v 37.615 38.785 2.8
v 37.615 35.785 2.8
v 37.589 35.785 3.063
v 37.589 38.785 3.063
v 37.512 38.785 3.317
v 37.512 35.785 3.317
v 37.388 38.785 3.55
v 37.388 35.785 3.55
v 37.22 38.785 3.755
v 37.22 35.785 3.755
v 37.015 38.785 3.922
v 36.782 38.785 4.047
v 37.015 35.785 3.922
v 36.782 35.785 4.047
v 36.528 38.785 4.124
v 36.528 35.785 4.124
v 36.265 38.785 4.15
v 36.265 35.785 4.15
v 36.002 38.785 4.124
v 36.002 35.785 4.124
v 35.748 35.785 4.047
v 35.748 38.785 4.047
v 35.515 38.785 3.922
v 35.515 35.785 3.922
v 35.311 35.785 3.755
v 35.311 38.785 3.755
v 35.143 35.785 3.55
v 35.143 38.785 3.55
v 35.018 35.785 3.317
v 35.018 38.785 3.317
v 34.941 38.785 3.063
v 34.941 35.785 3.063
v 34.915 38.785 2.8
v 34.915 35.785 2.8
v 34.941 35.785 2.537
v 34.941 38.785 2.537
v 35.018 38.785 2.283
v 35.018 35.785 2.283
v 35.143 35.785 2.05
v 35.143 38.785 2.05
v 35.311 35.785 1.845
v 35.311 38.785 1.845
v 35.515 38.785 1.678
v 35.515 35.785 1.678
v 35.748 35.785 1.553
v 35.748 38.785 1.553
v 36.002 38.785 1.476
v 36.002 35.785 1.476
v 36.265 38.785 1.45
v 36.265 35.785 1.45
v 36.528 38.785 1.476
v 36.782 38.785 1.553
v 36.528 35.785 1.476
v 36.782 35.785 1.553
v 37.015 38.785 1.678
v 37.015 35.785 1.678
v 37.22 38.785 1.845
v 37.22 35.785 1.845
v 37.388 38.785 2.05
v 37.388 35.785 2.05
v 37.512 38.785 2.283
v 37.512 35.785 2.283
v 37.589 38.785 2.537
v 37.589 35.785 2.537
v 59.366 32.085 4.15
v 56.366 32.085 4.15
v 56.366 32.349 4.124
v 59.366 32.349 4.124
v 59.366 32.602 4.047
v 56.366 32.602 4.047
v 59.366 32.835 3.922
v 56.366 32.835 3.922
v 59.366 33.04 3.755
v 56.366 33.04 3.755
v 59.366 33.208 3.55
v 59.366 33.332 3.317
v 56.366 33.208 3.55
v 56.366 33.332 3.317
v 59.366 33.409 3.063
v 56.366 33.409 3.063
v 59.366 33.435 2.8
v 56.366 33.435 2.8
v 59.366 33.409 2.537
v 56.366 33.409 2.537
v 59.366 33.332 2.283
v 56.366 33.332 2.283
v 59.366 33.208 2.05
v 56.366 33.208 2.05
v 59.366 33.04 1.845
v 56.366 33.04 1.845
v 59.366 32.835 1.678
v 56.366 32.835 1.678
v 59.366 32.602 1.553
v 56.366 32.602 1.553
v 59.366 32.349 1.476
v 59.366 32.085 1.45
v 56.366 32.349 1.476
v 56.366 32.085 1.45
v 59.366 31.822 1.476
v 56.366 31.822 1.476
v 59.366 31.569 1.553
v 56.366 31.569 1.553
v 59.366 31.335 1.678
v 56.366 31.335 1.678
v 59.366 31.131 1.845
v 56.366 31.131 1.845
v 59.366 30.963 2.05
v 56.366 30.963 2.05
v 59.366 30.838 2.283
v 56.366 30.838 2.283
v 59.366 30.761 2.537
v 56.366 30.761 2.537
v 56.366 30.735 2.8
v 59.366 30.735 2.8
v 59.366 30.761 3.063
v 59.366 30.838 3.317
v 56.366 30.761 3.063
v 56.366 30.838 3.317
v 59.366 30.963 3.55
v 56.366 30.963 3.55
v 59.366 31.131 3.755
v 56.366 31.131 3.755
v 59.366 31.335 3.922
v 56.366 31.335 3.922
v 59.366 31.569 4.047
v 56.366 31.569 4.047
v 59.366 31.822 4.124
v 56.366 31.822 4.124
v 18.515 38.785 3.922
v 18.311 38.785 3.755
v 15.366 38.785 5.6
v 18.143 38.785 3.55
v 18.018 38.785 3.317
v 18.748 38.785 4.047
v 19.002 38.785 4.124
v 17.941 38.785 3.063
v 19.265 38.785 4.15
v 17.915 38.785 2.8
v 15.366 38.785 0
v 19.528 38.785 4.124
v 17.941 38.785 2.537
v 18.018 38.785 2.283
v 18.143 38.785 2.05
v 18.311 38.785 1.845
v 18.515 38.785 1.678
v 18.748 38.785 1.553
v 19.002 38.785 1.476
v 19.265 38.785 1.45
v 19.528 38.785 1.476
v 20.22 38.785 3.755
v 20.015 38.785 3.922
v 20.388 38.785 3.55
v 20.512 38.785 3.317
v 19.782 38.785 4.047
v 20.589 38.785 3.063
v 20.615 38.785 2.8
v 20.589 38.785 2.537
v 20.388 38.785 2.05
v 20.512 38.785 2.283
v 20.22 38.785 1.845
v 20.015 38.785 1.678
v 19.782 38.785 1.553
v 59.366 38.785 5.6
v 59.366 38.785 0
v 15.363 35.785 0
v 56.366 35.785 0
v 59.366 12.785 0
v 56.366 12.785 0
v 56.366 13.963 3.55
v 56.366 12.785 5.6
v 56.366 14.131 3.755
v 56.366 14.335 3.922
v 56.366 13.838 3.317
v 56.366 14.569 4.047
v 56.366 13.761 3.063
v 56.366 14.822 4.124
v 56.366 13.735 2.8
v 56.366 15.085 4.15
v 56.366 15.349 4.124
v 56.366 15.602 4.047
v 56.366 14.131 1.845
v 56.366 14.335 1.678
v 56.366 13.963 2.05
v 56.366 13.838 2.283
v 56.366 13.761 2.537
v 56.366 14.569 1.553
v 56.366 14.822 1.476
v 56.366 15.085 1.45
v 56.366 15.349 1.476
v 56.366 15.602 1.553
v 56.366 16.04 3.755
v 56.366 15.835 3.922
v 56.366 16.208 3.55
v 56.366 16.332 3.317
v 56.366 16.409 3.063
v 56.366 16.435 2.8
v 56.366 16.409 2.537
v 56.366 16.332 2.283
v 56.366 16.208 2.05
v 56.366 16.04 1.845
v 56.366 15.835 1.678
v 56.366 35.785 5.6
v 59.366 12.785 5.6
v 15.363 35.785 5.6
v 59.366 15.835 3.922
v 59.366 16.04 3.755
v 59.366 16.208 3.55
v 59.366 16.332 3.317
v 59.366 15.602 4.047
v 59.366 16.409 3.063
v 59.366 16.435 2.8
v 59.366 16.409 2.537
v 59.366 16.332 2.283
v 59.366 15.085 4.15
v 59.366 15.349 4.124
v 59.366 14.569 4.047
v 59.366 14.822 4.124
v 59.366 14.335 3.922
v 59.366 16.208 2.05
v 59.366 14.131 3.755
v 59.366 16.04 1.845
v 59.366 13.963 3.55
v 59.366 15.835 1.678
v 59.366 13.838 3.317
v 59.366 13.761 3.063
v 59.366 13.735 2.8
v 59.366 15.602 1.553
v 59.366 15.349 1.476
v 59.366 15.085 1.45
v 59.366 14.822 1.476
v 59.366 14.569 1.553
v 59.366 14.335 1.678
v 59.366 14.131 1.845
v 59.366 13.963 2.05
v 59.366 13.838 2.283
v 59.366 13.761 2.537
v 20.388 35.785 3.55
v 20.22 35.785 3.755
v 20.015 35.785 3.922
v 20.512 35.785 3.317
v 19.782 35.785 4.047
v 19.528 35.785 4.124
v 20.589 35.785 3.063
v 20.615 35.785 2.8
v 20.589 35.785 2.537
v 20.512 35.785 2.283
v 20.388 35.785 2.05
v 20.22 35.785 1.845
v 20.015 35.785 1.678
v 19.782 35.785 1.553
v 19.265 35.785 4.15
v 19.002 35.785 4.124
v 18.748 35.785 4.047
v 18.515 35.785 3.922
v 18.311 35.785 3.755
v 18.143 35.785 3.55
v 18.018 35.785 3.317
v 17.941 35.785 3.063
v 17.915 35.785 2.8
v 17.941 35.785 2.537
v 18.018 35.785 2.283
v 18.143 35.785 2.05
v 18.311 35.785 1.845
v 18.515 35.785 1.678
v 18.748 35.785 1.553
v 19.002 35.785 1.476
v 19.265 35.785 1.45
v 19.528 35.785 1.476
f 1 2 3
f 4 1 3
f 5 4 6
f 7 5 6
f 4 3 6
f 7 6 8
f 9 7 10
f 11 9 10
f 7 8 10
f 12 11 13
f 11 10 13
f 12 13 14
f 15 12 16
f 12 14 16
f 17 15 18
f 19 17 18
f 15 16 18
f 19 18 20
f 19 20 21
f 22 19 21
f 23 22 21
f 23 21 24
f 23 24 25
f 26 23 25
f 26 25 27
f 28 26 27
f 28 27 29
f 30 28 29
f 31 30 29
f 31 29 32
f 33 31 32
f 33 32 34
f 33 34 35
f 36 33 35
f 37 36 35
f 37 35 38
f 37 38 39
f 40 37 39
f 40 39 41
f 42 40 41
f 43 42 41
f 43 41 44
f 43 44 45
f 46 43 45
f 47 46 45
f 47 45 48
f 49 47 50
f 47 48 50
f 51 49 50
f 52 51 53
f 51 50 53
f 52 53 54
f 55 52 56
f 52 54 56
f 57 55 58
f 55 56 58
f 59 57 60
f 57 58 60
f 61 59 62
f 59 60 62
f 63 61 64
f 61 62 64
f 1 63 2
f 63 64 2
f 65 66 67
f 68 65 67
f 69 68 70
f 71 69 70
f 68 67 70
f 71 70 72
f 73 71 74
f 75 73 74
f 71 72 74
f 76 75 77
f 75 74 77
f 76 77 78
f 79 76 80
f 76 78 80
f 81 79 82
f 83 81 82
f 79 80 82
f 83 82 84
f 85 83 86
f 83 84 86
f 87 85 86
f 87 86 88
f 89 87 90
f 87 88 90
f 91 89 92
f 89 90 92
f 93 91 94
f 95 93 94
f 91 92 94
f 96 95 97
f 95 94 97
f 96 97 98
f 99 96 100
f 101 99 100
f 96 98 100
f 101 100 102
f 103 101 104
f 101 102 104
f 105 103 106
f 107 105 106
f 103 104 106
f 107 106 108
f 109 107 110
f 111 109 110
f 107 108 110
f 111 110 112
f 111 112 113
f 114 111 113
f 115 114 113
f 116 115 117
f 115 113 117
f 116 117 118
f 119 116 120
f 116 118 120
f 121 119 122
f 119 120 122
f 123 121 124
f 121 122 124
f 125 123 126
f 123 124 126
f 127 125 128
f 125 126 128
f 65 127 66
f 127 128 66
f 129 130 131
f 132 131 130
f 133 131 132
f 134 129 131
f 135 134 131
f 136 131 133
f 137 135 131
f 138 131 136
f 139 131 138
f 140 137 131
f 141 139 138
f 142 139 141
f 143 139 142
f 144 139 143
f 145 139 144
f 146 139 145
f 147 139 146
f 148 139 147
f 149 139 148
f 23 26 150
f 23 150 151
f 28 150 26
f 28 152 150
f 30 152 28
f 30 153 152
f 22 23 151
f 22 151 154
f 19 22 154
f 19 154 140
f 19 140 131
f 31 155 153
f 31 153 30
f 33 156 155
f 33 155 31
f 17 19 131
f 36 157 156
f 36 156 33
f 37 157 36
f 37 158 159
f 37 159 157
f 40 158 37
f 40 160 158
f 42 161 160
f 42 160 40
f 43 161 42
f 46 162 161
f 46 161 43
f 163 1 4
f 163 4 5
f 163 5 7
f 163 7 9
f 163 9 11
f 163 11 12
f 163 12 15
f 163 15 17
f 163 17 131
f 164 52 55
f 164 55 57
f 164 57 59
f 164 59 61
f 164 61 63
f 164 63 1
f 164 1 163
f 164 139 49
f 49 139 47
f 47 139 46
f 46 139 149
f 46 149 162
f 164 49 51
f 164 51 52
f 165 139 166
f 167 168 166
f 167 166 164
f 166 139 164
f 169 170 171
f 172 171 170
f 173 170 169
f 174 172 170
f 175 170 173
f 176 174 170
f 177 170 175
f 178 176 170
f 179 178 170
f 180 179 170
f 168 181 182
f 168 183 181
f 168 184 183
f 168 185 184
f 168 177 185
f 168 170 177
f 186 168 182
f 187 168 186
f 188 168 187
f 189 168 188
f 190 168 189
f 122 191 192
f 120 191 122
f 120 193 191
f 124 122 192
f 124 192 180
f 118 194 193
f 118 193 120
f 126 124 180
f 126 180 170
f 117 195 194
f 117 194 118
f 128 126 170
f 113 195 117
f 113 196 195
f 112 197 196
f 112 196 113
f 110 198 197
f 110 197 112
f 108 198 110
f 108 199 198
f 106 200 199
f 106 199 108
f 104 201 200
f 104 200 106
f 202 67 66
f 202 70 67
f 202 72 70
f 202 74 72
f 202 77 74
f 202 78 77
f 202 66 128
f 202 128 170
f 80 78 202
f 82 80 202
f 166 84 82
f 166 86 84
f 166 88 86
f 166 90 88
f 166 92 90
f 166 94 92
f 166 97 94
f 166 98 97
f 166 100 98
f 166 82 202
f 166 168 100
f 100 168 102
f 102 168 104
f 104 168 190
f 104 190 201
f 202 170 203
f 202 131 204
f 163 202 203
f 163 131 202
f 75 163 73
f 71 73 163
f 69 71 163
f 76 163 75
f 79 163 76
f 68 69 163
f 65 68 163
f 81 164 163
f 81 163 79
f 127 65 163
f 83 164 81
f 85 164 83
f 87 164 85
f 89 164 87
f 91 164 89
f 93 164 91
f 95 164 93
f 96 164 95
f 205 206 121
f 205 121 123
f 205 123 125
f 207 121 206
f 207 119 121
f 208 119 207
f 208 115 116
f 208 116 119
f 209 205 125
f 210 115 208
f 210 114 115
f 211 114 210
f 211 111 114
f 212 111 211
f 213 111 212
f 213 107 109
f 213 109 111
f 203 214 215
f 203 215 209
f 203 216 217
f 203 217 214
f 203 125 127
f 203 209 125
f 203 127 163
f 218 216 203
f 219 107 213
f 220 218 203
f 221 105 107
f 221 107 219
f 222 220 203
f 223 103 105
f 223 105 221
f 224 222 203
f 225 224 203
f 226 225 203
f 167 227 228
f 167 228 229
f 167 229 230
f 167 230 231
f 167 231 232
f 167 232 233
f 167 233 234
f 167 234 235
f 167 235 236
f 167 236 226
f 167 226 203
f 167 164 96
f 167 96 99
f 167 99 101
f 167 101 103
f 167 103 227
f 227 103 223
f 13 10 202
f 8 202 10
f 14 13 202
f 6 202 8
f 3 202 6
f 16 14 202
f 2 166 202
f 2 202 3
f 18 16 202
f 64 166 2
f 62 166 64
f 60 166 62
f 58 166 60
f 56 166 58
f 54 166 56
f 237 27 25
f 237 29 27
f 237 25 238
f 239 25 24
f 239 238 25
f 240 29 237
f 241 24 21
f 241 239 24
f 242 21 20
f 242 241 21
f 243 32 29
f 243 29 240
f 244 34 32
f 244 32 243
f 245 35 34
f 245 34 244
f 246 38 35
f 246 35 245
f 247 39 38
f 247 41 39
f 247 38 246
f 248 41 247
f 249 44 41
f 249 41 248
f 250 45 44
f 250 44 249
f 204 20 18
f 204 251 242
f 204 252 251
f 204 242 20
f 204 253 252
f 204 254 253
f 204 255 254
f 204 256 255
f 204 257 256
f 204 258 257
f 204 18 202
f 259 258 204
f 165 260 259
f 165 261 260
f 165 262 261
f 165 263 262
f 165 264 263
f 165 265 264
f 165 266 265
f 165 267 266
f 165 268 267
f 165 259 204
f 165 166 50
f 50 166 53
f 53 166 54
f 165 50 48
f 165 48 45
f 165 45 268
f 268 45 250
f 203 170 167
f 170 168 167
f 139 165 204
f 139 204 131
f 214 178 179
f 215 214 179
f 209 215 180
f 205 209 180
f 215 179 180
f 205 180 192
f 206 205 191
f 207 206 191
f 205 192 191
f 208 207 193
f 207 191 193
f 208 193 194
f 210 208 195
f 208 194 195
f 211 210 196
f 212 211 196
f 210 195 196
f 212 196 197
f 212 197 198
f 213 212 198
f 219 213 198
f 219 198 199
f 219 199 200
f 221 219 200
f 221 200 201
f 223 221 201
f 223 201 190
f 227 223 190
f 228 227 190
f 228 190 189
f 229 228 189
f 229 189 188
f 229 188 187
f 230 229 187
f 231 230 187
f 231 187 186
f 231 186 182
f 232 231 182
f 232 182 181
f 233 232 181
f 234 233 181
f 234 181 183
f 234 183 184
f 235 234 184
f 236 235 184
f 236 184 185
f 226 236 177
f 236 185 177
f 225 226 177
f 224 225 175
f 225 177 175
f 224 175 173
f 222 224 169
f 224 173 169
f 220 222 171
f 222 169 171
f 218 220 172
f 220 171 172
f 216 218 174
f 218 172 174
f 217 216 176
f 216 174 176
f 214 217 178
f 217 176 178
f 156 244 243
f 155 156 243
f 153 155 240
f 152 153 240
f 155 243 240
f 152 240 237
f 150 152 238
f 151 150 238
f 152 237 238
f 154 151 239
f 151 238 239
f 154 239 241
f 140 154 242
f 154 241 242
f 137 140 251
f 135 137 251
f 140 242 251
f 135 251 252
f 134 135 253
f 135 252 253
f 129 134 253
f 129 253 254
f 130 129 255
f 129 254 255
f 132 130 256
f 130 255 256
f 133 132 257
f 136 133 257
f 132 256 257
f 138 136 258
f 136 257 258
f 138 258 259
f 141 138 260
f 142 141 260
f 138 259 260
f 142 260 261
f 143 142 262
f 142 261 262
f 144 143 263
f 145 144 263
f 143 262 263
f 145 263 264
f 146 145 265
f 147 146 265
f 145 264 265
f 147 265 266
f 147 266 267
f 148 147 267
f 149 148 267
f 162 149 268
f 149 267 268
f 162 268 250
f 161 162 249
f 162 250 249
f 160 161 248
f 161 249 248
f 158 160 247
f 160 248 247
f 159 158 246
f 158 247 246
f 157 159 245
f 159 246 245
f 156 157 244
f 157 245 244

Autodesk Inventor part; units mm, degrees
ref_plane "YZ Plane" through (0, 0, 0) normal (1, 0, 0) x (0, 1, 0)
ref_plane "XZ Plane" through (0, 0, 0) normal (0, 1, 0) x (-1, 0, 0)
ref_plane "XY Plane" through (0, 0, 0) normal (0, 0, 1) x (1, 0, 0)
sketch "Sketch1" plane through (0, 0, 0) normal (0, 0, 1) x (1, 0, 0)
  line L0 (56.3662, 12.7852) -> (56.3662, 35.7852)
  line L1 (56.3662, 35.7852) -> (15.3628, 35.7852)
  line L2 (15.3628, 35.7852) -> (15.3662, 38.7852)
  line L3 (15.3662, 38.7852) -> (59.3662, 38.7852)
  line L4 (59.3662, 38.7852) -> (59.3662, 12.7852)
  line L5 (56.3662, 12.7852) -> (59.3662, 12.7852)
  point P0 (0, 0)
  dimension "d0" = 3
  dimension "d1" = 3
  dimension "d2" = 26
  dimension "d3" = 44
extrude "Extrusion1" add sketch "Sketch1" along normal blind 5.6
sketch "Sketch2" plane through (56.3662, 12.7852, 0) normal (-1, 0, 0) x (0, 0, 1)
  circle A0 centre (2.8, 19.3) radius 1.35 projected
  circle A1 centre (2.8, 2.3) radius 1.35 projected
  circle A2 centre (2.8, 19.3) radius 1.35
  circle A3 centre (2.8, 2.3) radius 1.35
  point P0 (0, -12.7852)
  dimension "d6" = 2.7
  dimension "d7" = 2.7
extrude "Extrusion2" cut sketch "Sketch2" against normal through all
sketch "Sketch3" plane through (15.3628, 35.7852, 0) normal (0, -1, 0) x (1, 0, 0)
  circle A0 centre (3.9023, 2.8) radius 1.35 projected
  circle A1 centre (20.9023, 2.8) radius 1.35 projected
  circle A2 centre (3.9023, 2.8) radius 1.35
  circle A3 centre (20.9023, 2.8) radius 1.35
  point P0 (-15.3628, 0)
  dimension "d10" = 2.7
  dimension "d11" = 2.7
extrude "Extrusion3" cut sketch "Sketch3" against normal through all
properties part number "Pelvis" material "Aluminum-6061"
